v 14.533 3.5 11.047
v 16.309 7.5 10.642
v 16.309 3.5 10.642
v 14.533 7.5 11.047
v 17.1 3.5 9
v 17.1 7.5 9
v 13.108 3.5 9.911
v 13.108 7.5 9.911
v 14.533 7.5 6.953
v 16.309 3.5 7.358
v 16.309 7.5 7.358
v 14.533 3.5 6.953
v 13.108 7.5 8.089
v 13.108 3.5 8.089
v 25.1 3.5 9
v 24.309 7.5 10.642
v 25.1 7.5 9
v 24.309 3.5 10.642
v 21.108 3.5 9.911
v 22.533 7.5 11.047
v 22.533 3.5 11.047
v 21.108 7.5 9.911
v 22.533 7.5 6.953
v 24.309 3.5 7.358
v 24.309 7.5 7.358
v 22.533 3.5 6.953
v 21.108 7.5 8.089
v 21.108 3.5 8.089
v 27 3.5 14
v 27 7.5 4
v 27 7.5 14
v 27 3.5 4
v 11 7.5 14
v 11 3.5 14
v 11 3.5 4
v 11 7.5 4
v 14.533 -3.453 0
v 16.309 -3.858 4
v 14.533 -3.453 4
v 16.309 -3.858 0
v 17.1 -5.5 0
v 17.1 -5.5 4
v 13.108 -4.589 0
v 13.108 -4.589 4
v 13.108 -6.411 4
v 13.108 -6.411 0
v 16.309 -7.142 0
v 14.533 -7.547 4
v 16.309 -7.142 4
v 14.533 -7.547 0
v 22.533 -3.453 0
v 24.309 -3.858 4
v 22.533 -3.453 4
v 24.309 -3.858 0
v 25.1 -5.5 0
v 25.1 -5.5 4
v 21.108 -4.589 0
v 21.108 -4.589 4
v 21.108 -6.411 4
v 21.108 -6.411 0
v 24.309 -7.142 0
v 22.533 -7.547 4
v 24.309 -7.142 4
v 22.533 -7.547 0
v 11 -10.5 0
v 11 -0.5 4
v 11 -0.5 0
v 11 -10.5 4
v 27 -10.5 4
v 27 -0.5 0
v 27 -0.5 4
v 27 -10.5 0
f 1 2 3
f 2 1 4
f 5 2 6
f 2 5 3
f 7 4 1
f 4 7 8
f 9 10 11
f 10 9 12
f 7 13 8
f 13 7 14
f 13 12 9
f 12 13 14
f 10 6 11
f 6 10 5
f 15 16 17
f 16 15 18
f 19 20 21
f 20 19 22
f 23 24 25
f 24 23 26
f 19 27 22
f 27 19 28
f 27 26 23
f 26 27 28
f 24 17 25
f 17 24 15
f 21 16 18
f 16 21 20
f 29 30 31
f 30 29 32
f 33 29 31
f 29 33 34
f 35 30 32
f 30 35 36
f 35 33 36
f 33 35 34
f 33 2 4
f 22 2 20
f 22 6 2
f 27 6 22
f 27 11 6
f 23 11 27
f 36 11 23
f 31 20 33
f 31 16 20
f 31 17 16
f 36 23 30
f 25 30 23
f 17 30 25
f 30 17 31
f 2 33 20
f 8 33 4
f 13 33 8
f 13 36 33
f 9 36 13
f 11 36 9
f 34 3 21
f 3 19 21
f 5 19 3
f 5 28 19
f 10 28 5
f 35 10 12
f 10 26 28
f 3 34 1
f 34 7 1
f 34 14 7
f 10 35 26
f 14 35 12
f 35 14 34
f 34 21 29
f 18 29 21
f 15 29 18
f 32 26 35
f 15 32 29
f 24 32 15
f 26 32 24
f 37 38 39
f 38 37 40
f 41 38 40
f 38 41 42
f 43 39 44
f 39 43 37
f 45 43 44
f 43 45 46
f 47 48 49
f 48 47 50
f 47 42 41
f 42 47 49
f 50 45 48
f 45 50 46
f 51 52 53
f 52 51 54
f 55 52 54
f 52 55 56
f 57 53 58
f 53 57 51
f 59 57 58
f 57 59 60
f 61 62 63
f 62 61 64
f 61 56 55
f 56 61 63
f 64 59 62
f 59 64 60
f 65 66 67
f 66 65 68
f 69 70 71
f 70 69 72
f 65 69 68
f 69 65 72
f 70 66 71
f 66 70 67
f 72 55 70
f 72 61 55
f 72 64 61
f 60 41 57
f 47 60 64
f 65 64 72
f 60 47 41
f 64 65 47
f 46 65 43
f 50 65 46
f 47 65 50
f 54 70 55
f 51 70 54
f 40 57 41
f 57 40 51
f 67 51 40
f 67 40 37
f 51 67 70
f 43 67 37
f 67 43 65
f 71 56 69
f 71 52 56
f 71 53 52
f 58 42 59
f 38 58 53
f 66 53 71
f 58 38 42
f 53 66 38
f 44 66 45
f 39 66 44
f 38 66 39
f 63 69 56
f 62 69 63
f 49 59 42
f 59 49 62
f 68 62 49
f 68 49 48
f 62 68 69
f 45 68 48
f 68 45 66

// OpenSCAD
difference(){
union(){
scale([0.4,0.4,1]) linear_extrude(file = "servo_stick.dxf",
height = 4, convexity = 10
);
 translate([11,3.5,4])cube([16,4,10]);
}

union(){

translate([15,20,9])rotate([90,0,0])cylinder(r=2.1,h=100);
translate([23,20,9])rotate([90,0,0])cylinder(r=2.1,h=100);
translate([8,11,-10])cylinder(r=1.2,h=100);
translate([8,16,-10])cylinder(r=1.2,h=100);
translate([8,21,-10])cylinder(r=1.2,h=100);
translate([8,26,-10])cylinder(r=1.2,h=100);
translate([8,31,-10])cylinder(r=1.2,h=100);

}
}

difference(){
 translate([11,3.5-4,0])rotate([90,0,0])cube([16,4,10]);
union(){
translate([15,-5.5,-1])cylinder(r=2.1,h=100);
translate([23,-5.5,-1])cylinder(r=2.1,h=100);
}
}
